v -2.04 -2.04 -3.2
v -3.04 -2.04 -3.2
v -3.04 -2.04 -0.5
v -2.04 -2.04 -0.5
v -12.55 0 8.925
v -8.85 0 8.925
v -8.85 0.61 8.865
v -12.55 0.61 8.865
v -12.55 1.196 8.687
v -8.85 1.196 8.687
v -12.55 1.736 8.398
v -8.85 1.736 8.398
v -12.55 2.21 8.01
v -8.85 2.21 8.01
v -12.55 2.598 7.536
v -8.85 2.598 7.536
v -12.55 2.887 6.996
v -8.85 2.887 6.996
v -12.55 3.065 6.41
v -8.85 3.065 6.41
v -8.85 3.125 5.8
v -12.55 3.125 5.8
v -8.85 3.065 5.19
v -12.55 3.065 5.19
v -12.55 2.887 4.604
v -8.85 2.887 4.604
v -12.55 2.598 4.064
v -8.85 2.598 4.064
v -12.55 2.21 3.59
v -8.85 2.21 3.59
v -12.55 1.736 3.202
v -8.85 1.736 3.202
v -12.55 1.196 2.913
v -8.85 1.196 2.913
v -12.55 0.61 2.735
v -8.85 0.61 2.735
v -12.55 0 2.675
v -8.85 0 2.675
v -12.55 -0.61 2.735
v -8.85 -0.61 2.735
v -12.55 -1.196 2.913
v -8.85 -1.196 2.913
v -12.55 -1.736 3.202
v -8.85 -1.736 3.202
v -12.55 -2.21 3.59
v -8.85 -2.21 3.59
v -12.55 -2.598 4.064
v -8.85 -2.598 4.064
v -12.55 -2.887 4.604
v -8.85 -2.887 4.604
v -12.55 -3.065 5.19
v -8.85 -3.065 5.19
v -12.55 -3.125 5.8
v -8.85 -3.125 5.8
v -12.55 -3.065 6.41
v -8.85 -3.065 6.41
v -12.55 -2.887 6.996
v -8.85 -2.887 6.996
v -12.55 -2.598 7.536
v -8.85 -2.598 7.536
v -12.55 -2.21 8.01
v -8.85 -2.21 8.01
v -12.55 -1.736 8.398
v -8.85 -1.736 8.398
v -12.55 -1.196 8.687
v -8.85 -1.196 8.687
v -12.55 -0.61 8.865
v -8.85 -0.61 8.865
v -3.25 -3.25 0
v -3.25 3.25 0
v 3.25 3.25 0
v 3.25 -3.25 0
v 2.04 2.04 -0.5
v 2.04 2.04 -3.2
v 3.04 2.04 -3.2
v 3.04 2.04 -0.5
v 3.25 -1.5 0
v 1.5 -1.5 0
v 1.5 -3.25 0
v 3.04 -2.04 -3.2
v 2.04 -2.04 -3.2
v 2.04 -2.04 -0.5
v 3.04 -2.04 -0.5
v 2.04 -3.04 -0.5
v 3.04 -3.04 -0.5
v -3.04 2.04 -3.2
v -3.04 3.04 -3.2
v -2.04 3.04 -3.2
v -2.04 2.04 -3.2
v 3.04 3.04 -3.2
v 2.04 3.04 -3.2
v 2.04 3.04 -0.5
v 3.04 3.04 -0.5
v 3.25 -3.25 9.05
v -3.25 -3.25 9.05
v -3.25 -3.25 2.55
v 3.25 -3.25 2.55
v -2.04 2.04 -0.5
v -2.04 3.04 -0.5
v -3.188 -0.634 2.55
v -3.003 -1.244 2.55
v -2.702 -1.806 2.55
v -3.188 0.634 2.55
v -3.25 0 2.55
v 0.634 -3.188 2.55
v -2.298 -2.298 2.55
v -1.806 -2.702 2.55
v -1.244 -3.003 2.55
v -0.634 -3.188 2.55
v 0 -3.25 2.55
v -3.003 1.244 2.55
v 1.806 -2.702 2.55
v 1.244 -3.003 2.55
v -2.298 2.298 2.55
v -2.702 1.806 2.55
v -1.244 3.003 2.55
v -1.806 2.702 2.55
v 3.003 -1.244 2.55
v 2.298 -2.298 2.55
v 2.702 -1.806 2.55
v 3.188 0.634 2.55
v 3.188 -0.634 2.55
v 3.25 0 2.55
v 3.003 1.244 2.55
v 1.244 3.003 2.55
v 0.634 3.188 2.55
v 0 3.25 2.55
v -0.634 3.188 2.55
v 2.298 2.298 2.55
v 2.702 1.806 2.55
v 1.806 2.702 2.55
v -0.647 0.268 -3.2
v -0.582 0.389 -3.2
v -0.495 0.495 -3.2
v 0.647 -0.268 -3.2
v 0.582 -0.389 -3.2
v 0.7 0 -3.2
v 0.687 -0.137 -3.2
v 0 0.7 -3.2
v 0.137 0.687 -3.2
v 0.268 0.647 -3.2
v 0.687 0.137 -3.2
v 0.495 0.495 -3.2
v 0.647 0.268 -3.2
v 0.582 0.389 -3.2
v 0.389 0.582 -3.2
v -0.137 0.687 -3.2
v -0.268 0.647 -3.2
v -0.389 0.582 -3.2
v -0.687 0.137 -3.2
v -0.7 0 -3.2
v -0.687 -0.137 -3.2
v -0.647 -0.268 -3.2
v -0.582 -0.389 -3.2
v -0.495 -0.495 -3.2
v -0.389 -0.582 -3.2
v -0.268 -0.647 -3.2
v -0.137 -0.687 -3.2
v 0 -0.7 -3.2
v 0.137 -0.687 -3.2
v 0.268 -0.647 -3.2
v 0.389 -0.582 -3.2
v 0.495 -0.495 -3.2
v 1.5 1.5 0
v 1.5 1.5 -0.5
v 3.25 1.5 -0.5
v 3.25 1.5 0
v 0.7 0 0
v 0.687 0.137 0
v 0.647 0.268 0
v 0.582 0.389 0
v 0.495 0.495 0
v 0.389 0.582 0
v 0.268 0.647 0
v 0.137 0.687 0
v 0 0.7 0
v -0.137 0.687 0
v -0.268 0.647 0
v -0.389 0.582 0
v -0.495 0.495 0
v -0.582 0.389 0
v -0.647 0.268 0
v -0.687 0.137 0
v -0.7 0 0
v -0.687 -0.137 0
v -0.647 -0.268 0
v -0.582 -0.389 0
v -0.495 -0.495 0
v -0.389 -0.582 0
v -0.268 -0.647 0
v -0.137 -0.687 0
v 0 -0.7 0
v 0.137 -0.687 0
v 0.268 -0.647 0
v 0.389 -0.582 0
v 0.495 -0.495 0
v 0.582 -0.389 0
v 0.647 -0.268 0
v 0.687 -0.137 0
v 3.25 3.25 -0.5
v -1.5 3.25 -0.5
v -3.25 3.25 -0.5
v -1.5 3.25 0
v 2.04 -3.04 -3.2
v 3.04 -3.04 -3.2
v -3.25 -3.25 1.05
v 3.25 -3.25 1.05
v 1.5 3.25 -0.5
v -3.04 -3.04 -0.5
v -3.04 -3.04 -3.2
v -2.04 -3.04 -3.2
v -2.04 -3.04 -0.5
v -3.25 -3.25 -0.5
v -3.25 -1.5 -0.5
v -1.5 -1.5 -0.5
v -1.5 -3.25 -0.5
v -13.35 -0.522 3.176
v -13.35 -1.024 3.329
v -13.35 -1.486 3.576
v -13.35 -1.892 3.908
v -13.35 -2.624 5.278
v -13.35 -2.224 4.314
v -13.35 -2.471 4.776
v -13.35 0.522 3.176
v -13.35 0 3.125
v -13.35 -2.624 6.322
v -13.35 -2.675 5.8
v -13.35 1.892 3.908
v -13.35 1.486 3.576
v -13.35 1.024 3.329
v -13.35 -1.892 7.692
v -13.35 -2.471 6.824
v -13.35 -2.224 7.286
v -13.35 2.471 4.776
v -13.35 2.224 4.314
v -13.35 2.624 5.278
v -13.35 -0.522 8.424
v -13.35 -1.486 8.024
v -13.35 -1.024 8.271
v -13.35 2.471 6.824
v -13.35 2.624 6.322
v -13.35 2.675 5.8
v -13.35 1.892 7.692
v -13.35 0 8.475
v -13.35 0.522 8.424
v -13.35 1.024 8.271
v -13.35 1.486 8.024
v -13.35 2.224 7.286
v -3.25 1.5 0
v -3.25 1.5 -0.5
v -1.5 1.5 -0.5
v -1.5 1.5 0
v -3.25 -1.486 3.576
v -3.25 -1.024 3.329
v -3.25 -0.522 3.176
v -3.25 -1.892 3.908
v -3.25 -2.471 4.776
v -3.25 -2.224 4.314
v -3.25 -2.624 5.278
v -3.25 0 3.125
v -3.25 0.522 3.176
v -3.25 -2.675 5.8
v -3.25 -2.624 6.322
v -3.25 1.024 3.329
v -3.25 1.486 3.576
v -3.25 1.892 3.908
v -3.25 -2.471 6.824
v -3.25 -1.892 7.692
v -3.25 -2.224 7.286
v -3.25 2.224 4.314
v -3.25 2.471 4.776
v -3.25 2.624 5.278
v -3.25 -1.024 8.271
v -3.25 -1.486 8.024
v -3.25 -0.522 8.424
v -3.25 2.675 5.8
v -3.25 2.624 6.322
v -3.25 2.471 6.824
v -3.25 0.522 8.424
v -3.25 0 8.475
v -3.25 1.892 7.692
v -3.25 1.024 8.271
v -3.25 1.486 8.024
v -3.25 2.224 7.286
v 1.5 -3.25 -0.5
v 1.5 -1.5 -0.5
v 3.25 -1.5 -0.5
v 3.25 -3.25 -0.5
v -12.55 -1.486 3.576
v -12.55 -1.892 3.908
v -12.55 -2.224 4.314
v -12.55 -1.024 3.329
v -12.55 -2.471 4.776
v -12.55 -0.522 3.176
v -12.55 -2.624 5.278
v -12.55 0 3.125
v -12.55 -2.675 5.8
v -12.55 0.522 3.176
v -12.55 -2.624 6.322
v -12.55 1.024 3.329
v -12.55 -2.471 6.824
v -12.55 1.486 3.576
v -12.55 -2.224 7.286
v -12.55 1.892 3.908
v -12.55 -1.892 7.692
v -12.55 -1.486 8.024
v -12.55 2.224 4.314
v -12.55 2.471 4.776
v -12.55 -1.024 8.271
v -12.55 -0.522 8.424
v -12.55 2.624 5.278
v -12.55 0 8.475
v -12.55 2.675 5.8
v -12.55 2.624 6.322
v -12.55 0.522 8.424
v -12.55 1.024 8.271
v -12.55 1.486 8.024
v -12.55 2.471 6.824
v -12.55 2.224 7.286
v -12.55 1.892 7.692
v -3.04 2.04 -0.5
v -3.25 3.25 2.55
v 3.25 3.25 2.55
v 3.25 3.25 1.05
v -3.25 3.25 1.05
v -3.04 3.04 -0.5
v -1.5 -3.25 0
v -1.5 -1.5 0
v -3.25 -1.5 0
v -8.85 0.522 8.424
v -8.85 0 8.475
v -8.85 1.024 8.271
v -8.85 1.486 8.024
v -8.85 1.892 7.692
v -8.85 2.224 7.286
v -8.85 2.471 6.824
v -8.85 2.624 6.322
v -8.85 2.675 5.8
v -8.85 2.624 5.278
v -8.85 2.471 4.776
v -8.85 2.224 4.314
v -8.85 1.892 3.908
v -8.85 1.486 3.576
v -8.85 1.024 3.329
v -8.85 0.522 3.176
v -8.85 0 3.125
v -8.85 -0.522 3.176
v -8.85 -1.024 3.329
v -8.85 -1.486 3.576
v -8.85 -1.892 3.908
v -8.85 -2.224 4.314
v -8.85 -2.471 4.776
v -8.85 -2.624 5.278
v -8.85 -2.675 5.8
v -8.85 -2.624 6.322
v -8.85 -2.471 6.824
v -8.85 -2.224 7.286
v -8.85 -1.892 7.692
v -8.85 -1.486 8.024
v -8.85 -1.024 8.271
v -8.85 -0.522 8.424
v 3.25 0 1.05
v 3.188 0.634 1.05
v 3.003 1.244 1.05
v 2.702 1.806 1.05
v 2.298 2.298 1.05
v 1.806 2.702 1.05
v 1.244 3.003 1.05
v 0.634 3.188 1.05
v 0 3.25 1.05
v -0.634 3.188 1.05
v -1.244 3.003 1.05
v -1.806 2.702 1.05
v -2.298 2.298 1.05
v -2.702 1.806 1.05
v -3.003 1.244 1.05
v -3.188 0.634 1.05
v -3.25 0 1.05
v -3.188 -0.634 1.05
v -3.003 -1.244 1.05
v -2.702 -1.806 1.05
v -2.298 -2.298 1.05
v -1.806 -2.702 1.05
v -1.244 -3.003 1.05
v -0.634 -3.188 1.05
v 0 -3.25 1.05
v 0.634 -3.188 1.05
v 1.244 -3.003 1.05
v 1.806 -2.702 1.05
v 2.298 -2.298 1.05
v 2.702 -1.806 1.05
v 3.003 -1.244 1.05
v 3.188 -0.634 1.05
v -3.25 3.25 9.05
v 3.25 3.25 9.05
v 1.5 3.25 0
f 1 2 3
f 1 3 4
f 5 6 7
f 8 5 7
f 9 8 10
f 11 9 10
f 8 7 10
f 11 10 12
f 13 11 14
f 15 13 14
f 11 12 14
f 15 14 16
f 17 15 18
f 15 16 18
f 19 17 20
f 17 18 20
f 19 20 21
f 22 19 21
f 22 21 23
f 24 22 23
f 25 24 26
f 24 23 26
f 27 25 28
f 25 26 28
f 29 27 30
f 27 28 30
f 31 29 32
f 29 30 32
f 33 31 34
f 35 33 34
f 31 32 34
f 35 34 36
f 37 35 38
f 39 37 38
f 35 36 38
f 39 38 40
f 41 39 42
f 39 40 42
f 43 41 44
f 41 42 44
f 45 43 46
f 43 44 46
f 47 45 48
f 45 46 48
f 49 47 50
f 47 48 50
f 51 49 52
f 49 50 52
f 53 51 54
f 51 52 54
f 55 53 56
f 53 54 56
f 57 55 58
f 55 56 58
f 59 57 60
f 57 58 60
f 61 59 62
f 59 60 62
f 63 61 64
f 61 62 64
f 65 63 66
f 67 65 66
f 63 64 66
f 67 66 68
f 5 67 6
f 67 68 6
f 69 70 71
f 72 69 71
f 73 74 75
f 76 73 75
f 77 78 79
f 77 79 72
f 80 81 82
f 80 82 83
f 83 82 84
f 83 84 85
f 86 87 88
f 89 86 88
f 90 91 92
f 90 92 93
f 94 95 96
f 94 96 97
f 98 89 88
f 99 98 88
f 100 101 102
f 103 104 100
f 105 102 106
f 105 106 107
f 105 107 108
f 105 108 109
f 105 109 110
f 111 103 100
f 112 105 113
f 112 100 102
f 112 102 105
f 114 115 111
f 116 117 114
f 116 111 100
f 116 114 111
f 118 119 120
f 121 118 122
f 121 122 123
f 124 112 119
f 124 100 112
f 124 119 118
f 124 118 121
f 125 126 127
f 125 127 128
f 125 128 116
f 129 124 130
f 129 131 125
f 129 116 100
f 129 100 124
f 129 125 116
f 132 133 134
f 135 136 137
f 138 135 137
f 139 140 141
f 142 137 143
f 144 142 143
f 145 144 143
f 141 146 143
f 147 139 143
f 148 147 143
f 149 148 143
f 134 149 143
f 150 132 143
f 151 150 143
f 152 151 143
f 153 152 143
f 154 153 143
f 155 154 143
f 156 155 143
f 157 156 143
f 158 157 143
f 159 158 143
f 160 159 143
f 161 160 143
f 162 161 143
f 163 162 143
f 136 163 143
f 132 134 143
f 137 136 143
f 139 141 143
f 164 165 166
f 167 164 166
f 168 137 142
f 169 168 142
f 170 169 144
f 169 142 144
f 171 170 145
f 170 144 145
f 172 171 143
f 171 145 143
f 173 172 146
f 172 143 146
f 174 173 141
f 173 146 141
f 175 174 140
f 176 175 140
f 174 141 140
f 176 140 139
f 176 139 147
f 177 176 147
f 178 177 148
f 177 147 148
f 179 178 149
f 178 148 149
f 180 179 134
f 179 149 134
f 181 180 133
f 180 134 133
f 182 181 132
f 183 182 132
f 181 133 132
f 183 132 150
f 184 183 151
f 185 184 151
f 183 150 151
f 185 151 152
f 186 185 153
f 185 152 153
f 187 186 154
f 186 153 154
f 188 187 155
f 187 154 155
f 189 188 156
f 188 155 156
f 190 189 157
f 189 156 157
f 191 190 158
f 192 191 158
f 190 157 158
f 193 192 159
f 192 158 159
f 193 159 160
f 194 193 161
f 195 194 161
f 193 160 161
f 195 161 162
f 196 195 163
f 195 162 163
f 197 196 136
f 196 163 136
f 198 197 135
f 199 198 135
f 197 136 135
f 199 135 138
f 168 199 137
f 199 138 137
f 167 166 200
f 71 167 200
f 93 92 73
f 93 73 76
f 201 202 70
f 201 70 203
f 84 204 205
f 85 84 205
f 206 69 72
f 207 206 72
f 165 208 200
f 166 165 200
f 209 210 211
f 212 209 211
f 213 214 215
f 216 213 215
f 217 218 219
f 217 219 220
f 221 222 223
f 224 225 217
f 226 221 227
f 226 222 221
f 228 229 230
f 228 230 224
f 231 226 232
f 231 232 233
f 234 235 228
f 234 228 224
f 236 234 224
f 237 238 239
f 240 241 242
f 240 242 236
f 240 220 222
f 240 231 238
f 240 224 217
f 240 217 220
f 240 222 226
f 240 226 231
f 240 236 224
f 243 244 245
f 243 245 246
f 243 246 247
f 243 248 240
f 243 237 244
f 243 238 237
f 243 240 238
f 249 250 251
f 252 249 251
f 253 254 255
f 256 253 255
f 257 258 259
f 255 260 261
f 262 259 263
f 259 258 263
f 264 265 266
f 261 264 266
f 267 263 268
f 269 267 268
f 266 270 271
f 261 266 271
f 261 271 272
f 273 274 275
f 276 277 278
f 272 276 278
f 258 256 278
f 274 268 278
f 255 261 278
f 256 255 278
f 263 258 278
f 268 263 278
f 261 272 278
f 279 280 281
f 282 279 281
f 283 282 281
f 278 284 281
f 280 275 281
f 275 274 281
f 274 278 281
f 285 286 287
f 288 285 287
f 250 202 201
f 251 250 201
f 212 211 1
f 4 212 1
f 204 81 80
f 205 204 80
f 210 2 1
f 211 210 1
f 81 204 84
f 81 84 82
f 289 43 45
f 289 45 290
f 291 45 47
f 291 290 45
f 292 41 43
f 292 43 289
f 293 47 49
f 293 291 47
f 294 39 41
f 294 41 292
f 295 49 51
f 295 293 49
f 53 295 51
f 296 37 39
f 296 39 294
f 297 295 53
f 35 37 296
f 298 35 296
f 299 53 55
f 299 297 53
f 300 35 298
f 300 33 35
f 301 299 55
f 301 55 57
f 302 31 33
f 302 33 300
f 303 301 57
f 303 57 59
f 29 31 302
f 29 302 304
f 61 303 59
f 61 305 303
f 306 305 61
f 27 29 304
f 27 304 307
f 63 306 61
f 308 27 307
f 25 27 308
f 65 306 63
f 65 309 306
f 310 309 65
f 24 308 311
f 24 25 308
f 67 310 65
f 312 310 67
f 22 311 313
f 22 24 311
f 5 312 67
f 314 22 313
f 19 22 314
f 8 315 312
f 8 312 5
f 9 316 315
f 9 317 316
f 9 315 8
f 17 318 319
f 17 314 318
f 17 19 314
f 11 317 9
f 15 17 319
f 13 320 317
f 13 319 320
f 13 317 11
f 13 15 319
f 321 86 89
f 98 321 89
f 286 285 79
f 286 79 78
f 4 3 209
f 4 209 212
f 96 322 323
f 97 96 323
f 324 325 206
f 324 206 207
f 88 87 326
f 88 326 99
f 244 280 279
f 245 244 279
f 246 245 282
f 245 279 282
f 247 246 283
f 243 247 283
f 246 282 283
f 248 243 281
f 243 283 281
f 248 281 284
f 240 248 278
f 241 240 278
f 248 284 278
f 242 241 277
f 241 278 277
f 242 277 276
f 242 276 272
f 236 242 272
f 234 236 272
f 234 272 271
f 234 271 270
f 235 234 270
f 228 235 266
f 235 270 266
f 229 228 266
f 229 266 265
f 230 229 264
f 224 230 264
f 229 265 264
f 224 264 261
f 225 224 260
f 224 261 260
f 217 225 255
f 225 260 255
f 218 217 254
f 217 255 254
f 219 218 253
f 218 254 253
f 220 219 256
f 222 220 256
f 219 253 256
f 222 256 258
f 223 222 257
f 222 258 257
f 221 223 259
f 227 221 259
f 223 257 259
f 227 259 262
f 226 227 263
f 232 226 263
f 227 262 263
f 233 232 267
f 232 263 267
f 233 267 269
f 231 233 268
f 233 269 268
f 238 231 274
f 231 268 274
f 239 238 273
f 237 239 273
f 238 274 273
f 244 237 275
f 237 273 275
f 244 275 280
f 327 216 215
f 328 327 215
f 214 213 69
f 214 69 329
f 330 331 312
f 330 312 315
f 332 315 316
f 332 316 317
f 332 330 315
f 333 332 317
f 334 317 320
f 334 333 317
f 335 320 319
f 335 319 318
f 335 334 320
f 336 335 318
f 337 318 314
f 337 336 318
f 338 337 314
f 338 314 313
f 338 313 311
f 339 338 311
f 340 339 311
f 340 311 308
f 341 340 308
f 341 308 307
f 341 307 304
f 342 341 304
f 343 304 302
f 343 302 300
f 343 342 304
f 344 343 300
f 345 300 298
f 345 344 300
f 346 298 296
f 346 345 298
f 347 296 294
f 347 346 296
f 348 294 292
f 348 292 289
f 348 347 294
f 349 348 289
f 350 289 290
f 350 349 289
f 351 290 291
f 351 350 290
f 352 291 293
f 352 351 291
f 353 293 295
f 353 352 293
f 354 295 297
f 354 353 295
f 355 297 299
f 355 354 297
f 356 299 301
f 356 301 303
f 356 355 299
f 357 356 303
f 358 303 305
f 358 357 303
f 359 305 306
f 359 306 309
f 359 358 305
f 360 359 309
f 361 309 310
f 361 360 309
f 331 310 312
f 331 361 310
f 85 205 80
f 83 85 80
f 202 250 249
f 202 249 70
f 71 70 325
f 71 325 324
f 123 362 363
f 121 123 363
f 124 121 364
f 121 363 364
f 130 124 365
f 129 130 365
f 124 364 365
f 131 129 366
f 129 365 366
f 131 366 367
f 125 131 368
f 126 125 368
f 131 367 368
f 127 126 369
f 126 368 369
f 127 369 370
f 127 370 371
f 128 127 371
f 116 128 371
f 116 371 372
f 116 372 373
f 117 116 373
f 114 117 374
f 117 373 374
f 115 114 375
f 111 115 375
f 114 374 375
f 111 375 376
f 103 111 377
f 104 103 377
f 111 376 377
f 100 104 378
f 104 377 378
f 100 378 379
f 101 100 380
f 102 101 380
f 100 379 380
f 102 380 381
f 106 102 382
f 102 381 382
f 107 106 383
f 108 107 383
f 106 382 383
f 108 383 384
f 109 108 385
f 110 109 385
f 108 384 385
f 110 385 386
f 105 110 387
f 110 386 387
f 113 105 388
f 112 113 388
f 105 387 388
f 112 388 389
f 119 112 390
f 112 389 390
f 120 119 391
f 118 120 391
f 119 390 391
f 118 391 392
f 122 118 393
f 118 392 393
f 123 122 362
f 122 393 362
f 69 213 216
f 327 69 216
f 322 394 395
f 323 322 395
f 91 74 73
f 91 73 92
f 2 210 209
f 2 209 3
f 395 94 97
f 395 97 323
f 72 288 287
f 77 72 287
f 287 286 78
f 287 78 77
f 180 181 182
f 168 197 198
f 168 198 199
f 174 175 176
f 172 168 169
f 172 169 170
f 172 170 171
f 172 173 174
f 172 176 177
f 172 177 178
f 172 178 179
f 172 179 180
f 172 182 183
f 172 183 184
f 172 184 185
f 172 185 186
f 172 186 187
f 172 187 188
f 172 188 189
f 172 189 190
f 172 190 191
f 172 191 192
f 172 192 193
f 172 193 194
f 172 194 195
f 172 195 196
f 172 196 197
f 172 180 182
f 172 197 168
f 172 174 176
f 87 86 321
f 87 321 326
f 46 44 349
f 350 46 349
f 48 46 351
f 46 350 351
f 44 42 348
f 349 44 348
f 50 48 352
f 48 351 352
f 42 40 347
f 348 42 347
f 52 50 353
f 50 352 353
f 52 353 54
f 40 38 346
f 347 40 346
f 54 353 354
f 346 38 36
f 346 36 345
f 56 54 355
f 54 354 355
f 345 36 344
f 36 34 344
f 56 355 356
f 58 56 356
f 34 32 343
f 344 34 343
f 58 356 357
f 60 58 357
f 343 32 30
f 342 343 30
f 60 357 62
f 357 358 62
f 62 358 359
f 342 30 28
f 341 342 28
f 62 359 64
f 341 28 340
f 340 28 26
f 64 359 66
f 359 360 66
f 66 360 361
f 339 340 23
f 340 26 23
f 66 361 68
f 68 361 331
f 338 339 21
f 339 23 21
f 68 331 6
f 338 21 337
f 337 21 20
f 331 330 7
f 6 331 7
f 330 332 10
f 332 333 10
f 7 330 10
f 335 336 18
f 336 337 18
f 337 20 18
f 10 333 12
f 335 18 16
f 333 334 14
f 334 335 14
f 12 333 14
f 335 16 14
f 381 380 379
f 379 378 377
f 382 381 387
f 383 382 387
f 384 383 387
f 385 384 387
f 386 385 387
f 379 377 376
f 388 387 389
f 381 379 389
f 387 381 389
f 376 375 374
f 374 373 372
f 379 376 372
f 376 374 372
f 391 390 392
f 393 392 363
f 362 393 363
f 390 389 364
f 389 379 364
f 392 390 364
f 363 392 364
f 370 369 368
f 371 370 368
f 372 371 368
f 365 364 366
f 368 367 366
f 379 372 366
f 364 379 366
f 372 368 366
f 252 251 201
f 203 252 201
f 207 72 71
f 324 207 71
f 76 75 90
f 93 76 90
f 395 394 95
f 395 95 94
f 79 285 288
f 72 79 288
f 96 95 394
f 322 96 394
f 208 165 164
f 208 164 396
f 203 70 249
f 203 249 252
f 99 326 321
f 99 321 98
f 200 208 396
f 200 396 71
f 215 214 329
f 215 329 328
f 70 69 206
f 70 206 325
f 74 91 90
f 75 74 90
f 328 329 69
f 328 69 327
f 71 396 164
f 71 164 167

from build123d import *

# Parameters (mm, degrees)
CYLINDER_R        = 0.7
CYLINDER_DEPTH    = 3.2
BOX_W             = 6.5
BOX_H             = 6.5
BOX_DEPTH         = 1.05
CYLINDER001_R     = 3.25
CYLINDER001_DEPTH = 1.5
BOX001_W          = 6.5
BOX001_H          = 6.5
BOX001_DEPTH      = 6.5
CYLINDER002_R     = 2.675
CYLINDER002_DEPTH = 10.1
TUBE_R            = 3.125
TUBE_R_2          = 2.675
TUBE_DEPTH        = 3.7
BOX002_W          = 1.75
BOX002_H          = 1.75
BOX002_DEPTH      = 0.5
BOX003_W          = 1.75
BOX003_H          = 1.75
BOX003_DEPTH      = 0.5
BOX004_W          = 1.75
BOX004_H          = 1.75
BOX004_DEPTH      = 0.5
BOX005_W          = 1.75
BOX005_H          = 1.75
BOX005_DEPTH      = 0.5
BOX006_W          = 1
BOX006_H          = 1
BOX006_DEPTH      = 2.7
BOX007_W          = 1
BOX007_H          = 1
BOX007_DEPTH      = 2.7
BOX008_W          = 1
BOX008_H          = 1
BOX008_DEPTH      = 2.7
BOX009_W          = 1
BOX009_H          = 1
BOX009_DEPTH      = 2.7


with BuildPart() as cylinder:
    # Cylinder → Cylinder (new body)
    with BuildSketch(Plane.XY.offset(-3.2)):
        Circle(CYLINDER_R)
    extrude(amount=CYLINDER_DEPTH)


with BuildPart() as cube:
    # Box → Box (new body)
    with BuildSketch(Plane(origin=(-3.25, -3.25, 0), x_dir=(1, 0, 0), z_dir=(0, 0, 1))):
        with Locations((3.25, 3.25)):
            Rectangle(BOX_W, BOX_H)
    extrude(amount=BOX_DEPTH)


with BuildPart() as cylinder001:
    # Cylinder001 → Cylinder001 (new body)
    with BuildSketch(Plane.XY.offset(1.05)):
        Circle(CYLINDER001_R)
    extrude(amount=CYLINDER001_DEPTH)


with BuildPart() as cube001:
    # Box001 → Box001 (new body)
    with BuildSketch(Plane(origin=(-3.25, -3.25, 2.55), x_dir=(1, 0, 0), z_dir=(0, 0, 1))):
        with Locations((3.25, 3.25)):
            Rectangle(BOX001_W, BOX001_H)
    extrude(amount=BOX001_DEPTH)


with BuildPart() as cylinder002:
    # Cylinder002 → Cylinder002 (new body)
    with BuildSketch(Plane(origin=(-3.25, 0, 5.8), x_dir=(0, 0, 1), z_dir=(-1, 0, 0))):
        Circle(CYLINDER002_R)
    extrude(amount=CYLINDER002_DEPTH)


with BuildPart() as tube:
    # Tube → Tube (new body)
    with BuildSketch(Plane(origin=(-8.85, 0, 5.8), x_dir=(0, 0, 1), z_dir=(-1, 0, 0))):
        Circle(TUBE_R)
        Circle(TUBE_R_2, mode=Mode.SUBTRACT)
    extrude(amount=TUBE_DEPTH)


with BuildPart() as cube002:
    # Box002 → Box002 (new body)
    with BuildSketch(Plane(origin=(-3.25, -3.25, -0.5), x_dir=(1, 0, 0), z_dir=(0, 0, 1))):
        with Locations((0.875, 0.875)):
            Rectangle(BOX002_W, BOX002_H)
    extrude(amount=BOX002_DEPTH)


with BuildPart() as cube003:
    # Box003 → Box003 (new body)
    with BuildSketch(Plane(origin=(-3.25, 1.5, -0.5), x_dir=(1, 0, 0), z_dir=(0, 0, 1))):
        with Locations((0.875, 0.875)):
            Rectangle(BOX003_W, BOX003_H)
    extrude(amount=BOX003_DEPTH)


with BuildPart() as cube004:
    # Box004 → Box004 (new body)
    with BuildSketch(Plane(origin=(1.5, -3.25, -0.5), x_dir=(1, 0, 0), z_dir=(0, 0, 1))):
        with Locations((0.875, 0.875)):
            Rectangle(BOX004_W, BOX004_H)
    extrude(amount=BOX004_DEPTH)


with BuildPart() as cube005:
    # Box005 → Box005 (new body)
    with BuildSketch(Plane(origin=(1.5, 1.5, -0.5), x_dir=(1, 0, 0), z_dir=(0, 0, 1))):
        with Locations((0.875, 0.875)):
            Rectangle(BOX005_W, BOX005_H)
    extrude(amount=BOX005_DEPTH)


with BuildPart() as cube006:
    # Box006 → Box006 (new body)
    with BuildSketch(Plane(origin=(-3.04, -3.04, -3.2), x_dir=(1, 0, 0), z_dir=(0, 0, 1))):
        with Locations((0.5, 0.5)):
            Rectangle(BOX006_W, BOX006_H)
    extrude(amount=BOX006_DEPTH)


with BuildPart() as cube007:
    # Box007 → Box007 (new body)
    with BuildSketch(Plane(origin=(-3.04, 2.04, -3.2), x_dir=(1, 0, 0), z_dir=(0, 0, 1))):
        with Locations((0.5, 0.5)):
            Rectangle(BOX007_W, BOX007_H)
    extrude(amount=BOX007_DEPTH)


with BuildPart() as cube008:
    # Box008 → Box008 (new body)
    with BuildSketch(Plane(origin=(2.04, -3.04, -3.2), x_dir=(1, 0, 0), z_dir=(0, 0, 1))):
        with Locations((0.5, 0.5)):
            Rectangle(BOX008_W, BOX008_H)
    extrude(amount=BOX008_DEPTH)


with BuildPart() as cube009:
    # Box009 → Box009 (new body)
    with BuildSketch(Plane(origin=(2.04, 2.04, -3.2), x_dir=(1, 0, 0), z_dir=(0, 0, 1))):
        with Locations((0.5, 0.5)):
            Rectangle(BOX009_W, BOX009_H)
    extrude(amount=BOX009_DEPTH)


solid = Compound([cylinder.part, cube.part, cylinder001.part, cube001.part, cylinder002.part, tube.part, cube002.part, cube003.part, cube004.part, cube005.part, cube006.part, cube007.part, cube008.part, cube009.part])
